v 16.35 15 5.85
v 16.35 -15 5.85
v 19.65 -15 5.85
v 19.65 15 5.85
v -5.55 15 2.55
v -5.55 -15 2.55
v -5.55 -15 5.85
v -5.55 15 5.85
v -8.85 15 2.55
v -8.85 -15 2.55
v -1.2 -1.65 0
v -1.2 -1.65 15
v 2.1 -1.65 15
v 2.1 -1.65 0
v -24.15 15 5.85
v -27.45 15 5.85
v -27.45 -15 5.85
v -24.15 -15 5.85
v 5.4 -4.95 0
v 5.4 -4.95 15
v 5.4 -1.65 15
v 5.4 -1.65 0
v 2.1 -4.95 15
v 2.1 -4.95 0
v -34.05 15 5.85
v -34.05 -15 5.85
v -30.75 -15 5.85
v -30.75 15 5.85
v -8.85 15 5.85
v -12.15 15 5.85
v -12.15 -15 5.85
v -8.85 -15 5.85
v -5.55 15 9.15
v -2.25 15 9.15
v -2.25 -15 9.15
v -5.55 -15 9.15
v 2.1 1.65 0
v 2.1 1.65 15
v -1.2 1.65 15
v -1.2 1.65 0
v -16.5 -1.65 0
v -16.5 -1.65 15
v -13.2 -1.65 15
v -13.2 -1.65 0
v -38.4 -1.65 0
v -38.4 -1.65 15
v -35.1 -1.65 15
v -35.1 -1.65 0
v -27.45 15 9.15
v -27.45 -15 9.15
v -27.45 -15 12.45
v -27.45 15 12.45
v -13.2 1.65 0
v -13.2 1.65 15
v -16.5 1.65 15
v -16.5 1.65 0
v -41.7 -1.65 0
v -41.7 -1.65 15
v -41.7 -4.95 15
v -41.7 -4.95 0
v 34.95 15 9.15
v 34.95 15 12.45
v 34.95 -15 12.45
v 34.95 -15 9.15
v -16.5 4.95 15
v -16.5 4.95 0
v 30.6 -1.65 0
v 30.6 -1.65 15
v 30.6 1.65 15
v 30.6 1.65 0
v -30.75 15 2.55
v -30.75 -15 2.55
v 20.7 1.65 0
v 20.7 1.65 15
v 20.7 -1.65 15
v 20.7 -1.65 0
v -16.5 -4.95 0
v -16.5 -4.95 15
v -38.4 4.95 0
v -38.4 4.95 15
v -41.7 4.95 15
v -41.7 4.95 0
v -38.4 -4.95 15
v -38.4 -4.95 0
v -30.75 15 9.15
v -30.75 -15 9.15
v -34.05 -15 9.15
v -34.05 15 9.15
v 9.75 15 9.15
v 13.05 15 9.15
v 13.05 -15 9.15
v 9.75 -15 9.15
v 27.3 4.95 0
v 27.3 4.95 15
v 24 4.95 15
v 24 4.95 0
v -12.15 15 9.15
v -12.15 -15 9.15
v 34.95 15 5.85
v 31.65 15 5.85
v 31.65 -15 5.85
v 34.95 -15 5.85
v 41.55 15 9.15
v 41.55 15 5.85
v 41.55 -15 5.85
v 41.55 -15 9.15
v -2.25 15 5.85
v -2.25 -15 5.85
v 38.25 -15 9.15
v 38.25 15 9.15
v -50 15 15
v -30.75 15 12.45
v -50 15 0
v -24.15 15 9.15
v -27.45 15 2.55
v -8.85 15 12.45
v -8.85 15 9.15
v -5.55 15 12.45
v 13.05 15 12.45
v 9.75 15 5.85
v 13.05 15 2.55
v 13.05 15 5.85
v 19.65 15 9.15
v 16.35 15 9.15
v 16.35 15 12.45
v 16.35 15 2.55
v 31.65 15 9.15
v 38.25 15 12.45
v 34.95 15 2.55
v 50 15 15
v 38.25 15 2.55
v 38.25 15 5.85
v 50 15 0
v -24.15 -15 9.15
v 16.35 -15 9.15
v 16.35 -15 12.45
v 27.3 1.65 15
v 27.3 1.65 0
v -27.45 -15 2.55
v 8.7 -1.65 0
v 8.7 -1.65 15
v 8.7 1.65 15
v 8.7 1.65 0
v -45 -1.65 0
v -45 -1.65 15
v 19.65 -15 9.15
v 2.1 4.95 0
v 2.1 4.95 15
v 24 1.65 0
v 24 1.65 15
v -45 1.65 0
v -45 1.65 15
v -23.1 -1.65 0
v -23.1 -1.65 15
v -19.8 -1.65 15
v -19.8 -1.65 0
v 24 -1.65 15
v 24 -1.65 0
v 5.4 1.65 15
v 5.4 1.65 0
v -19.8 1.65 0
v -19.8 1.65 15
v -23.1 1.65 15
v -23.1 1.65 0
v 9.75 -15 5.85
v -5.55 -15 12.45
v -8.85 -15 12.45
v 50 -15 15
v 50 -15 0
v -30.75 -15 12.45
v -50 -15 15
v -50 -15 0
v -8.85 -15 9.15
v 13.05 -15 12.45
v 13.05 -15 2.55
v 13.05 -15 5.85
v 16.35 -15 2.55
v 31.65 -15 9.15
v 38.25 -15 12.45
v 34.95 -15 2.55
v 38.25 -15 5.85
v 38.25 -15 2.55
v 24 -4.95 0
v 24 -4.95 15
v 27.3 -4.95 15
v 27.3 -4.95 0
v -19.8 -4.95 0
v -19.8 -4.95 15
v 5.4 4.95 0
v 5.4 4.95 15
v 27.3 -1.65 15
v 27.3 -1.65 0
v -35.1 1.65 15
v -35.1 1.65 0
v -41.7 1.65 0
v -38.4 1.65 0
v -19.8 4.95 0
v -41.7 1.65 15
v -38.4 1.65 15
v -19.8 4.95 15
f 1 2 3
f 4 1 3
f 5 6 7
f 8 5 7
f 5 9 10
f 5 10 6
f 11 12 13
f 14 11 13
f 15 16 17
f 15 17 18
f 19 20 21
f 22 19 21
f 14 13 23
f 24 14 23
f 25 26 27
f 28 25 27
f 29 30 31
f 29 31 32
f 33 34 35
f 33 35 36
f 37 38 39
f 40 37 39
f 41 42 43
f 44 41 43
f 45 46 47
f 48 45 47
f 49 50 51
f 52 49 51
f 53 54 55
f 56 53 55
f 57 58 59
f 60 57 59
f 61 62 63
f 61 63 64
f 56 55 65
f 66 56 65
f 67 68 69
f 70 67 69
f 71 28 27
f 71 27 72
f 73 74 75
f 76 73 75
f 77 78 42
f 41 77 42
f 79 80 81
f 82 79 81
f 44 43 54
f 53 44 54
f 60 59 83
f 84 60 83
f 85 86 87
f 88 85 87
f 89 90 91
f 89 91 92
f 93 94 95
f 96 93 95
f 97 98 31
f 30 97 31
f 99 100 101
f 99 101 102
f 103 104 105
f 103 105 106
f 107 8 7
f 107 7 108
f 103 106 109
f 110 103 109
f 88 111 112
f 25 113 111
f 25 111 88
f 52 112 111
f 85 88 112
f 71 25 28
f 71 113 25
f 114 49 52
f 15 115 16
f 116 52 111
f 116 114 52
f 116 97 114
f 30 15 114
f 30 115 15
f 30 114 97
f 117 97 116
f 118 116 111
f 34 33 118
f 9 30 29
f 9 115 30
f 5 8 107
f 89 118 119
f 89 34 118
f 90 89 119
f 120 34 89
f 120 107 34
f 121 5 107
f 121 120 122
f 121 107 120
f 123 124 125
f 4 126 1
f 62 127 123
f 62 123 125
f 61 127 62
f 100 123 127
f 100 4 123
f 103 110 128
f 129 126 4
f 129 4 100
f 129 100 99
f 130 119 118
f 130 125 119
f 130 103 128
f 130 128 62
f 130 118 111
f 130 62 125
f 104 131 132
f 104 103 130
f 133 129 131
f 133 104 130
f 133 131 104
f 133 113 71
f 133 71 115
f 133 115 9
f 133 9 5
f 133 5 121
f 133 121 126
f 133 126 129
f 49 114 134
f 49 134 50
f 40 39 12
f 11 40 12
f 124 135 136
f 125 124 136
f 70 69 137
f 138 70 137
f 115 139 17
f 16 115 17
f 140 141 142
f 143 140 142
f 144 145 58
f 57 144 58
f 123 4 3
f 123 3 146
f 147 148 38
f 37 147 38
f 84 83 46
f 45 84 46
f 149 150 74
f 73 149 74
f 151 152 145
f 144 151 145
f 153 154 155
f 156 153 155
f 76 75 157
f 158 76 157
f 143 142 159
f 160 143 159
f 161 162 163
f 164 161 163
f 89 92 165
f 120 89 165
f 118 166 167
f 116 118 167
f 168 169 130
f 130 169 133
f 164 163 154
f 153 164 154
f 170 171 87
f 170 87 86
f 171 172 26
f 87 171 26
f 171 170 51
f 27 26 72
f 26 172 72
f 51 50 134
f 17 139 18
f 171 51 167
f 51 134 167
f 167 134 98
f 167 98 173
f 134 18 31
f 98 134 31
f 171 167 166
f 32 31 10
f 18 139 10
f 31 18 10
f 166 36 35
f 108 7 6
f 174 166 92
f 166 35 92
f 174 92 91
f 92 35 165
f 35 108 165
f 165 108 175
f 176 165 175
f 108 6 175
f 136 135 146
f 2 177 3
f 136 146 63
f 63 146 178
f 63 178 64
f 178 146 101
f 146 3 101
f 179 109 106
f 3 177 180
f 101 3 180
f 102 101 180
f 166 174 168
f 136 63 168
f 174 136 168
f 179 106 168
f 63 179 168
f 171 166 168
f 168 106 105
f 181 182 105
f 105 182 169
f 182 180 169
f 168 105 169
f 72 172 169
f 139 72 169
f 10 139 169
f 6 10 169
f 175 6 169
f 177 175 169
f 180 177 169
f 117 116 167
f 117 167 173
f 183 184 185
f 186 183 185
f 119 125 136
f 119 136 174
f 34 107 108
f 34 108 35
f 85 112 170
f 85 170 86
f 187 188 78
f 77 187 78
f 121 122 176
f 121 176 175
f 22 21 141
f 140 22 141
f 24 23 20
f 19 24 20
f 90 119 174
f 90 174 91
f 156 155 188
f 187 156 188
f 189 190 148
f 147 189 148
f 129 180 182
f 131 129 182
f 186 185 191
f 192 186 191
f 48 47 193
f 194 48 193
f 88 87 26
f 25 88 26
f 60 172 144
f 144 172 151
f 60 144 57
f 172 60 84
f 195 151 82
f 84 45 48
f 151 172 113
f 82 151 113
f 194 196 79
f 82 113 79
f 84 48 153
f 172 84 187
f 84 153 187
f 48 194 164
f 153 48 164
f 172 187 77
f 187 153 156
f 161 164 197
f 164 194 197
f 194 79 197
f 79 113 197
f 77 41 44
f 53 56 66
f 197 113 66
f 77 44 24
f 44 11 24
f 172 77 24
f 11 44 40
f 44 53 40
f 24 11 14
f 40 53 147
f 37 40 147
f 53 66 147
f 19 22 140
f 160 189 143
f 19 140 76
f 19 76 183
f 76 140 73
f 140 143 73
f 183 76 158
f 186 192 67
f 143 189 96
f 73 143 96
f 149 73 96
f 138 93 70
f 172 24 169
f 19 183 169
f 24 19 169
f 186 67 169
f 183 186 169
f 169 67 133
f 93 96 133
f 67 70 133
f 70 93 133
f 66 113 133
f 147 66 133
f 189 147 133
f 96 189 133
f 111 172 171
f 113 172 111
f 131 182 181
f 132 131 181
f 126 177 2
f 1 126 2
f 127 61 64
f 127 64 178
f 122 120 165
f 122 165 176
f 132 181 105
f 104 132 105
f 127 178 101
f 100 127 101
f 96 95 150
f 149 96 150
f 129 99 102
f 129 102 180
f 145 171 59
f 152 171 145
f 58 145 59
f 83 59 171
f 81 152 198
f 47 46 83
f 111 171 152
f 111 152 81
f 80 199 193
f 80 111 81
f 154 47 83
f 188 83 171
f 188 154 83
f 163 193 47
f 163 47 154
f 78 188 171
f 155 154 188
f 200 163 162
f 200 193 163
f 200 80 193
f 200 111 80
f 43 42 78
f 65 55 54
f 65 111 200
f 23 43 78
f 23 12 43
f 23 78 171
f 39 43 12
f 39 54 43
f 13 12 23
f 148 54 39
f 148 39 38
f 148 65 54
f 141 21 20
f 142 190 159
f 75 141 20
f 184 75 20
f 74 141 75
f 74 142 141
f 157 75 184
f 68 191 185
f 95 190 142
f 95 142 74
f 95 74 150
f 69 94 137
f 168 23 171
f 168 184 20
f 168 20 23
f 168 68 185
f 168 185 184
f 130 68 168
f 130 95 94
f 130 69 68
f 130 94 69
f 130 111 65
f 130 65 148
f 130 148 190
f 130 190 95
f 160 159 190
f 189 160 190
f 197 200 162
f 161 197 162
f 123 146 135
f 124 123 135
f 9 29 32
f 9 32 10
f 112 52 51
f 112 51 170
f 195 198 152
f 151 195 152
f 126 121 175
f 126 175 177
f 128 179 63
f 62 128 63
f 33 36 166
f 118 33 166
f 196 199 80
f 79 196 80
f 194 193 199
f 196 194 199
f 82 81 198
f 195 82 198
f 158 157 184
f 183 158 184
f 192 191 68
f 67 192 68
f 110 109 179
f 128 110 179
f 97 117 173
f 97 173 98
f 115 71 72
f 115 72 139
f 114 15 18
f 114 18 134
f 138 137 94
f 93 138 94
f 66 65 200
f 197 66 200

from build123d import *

# Parameters (mm, degrees)
F0_W     = 100
F0_H     = 30
F1_DEPTH = 15
F3_DEPTH = 15.001
F5_DEPTH = 30.001


with BuildPart() as f1:
    # F0 (on Top) → F1 (new body)
    with BuildSketch(Plane.XY):
        Rectangle(F0_W, F0_H)
    extrude(amount=F1_DEPTH)

    # F2 (on face) → F3 (cut, through all)
    with BuildSketch(Plane.XY.offset(15)):
        Polygon((-38.4, 4.95), (-41.7, 4.95), (-41.7, 1.65), (-45, 1.65), (-45, -1.65), (-41.7, -1.65), (-41.7, -4.95), (-38.4, -4.95), (-38.4, -1.65), (-35.1, -1.65), (-35.1, 1.65), (-38.4, 1.65), align=None)
        Polygon((-23.1, 1.65), (-23.1, -1.65), (-19.8, -1.65), (-19.8, -4.95), (-16.5, -4.95), (-16.5, -1.65), (-13.2, -1.65), (-13.2, 1.65), (-16.5, 1.65), (-16.5, 4.95), (-19.8, 4.95), (-19.8, 1.65), align=None)
        Polygon((-1.2, 1.65), (-1.2, -1.65), (2.1, -1.65), (2.1, -4.95), (5.4, -4.95), (5.4, -1.65), (8.7, -1.65), (8.7, 1.65), (5.4, 1.65), (5.4, 4.95), (2.1, 4.95), (2.1, 1.65), align=None)
        Polygon((20.7, 1.65), (20.7, -1.65), (24, -1.65), (24, -4.95), (27.3, -4.95), (27.3, -1.65), (30.6, -1.65), (30.6, 1.65), (27.3, 1.65), (27.3, 4.95), (24, 4.95), (24, 1.65), align=None)
    extrude(amount=-F3_DEPTH, mode=Mode.SUBTRACT)

    # F4 (on face) → F5 (cut, through all)
    with BuildSketch(Plane.XZ.offset(15)):
        Polygon((-27.45, 12.45), (-30.75, 12.45), (-30.75, 9.15), (-34.05, 9.15), (-34.05, 5.85), (-30.75, 5.85), (-30.75, 2.55), (-27.45, 2.55), (-27.45, 5.85), (-24.15, 5.85), (-24.15, 9.15), (-27.45, 9.15), align=None)
        Polygon((-8.85, 9.15), (-12.15, 9.15), (-12.15, 5.85), (-8.85, 5.85), (-8.85, 2.55), (-5.55, 2.55), (-5.55, 5.85), (-2.25, 5.85), (-2.25, 9.15), (-5.55, 9.15), (-5.55, 12.45), (-8.85, 12.45), align=None)
        Polygon((13.05, 9.15), (9.75, 9.15), (9.75, 5.85), (13.05, 5.85), (13.05, 2.55), (16.35, 2.55), (16.35, 5.85), (19.65, 5.85), (19.65, 9.15), (16.35, 9.15), (16.35, 12.45), (13.05, 12.45), align=None)
        Polygon((34.95, 9.15), (31.65, 9.15), (31.65, 5.85), (34.95, 5.85), (34.95, 2.55), (38.25, 2.55), (38.25, 5.85), (41.55, 5.85), (41.55, 9.15), (38.25, 9.15), (38.25, 12.45), (34.95, 12.45), align=None)
    extrude(amount=-F5_DEPTH, mode=Mode.SUBTRACT)


solid = f1.part
